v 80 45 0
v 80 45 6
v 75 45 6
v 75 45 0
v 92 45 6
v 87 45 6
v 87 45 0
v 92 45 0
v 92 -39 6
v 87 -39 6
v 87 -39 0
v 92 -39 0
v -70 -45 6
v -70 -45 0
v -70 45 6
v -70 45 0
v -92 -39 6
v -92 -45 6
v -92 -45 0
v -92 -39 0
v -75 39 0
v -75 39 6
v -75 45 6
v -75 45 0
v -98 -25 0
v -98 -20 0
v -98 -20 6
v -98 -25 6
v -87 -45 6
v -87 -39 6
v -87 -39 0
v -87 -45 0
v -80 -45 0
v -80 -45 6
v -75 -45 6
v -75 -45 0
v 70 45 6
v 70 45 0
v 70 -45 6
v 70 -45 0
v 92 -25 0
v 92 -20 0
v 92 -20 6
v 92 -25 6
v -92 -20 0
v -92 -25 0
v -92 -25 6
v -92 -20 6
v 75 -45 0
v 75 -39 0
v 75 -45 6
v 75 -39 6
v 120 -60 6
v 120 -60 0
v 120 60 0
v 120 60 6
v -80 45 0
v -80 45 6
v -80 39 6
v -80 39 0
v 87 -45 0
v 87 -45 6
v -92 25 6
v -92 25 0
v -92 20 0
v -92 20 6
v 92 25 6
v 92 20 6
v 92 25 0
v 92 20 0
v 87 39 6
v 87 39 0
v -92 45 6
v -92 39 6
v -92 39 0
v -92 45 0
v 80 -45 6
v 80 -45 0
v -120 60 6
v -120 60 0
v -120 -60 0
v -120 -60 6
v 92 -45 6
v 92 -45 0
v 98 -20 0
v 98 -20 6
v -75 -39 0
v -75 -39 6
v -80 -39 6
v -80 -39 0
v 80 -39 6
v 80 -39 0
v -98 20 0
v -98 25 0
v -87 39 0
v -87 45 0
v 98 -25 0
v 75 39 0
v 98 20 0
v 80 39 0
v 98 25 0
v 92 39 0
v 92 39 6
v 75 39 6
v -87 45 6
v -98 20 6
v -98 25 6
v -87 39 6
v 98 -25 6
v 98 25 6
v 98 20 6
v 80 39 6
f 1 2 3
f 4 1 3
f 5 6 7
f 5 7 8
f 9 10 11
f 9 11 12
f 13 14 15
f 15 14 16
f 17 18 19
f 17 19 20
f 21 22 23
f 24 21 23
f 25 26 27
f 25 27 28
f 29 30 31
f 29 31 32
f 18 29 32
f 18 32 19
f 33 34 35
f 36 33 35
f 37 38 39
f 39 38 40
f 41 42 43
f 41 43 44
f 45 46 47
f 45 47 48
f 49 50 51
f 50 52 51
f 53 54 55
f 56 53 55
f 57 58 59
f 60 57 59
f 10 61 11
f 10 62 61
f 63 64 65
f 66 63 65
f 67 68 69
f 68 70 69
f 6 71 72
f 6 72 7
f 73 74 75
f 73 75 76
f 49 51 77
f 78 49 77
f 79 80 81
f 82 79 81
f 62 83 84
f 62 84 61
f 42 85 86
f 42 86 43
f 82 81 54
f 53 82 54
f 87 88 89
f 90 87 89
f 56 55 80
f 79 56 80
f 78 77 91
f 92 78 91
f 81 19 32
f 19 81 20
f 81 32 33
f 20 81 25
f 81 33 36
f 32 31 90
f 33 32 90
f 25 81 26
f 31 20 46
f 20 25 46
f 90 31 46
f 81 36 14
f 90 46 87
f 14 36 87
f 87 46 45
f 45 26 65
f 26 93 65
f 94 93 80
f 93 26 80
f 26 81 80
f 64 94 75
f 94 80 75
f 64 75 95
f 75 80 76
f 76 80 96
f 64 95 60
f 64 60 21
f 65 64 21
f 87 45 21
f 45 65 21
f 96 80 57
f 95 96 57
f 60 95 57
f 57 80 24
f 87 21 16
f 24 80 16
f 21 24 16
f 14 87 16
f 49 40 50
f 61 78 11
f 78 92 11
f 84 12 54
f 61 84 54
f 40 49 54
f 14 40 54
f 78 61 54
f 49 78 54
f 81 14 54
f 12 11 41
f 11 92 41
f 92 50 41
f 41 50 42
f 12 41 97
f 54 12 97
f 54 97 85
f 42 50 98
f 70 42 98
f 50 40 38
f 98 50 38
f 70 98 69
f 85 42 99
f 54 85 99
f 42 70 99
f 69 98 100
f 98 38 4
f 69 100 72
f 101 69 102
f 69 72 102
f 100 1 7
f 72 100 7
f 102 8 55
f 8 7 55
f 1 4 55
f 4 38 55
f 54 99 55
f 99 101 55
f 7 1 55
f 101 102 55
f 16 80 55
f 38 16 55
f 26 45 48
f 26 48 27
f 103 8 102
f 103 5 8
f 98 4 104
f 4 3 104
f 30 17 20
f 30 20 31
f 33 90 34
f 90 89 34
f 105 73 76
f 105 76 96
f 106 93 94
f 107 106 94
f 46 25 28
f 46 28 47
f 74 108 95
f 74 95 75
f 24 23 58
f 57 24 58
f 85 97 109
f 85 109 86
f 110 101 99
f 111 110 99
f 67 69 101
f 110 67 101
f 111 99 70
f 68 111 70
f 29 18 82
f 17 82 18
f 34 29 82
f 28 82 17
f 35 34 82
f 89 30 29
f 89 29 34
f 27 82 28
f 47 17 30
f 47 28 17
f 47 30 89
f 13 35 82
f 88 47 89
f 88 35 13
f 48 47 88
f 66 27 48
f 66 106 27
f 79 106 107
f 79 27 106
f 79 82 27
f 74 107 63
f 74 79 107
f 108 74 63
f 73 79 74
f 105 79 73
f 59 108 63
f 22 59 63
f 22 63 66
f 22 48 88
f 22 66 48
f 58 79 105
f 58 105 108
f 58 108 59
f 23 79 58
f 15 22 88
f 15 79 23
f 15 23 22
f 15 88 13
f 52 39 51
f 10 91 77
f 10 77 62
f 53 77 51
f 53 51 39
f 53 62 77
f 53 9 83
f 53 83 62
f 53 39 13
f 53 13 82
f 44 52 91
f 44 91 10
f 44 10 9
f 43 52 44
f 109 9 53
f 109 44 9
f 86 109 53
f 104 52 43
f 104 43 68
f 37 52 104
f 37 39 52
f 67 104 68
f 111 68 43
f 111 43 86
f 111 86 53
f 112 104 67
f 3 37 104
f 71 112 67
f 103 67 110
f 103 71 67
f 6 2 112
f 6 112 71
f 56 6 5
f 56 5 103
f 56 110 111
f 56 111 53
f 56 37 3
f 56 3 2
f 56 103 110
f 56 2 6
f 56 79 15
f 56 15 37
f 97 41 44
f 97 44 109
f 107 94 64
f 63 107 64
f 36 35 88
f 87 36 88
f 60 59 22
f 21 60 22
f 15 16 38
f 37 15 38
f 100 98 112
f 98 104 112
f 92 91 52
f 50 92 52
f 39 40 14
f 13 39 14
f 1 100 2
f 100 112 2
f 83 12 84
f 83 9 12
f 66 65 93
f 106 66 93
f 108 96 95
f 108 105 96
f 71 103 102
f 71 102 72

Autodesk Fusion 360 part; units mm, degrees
sketch "Sketch1" plane through (0, 0, 0) normal (0, 0, 1) x (1, 0, 0) in component "Base"
  line L0 (120, 60) -> (-120, 60)
  line L1 (-120, 60) -> (-120, -60)
  line L2 (-120, -60) -> (120, -60)
  line L3 (120, -60) -> (120, 60)
  line L4 (120, 60) -> (-120, -60) construction
  line L5 (-120, 60) -> (120, -60) construction
  line L6 (-70, 45) -> (70, 45)
  line L7 (70, 45) -> (70, -45)
  line L8 (70, -45) -> (-70, -45)
  line L9 (-70, -45) -> (-70, 45)
  line L10 (-70, 45) -> (70, -45) construction
  line L11 (70, 45) -> (-70, -45) construction
  dimension "d1" = 240
  dimension "d2" = 120
  dimension "d3" = 90
  dimension "d6" = 140
extrude "Extrude1" add sketch "Sketch1" along normal blind 6 in component "Base"
sketch "Sketch2" plane through (0, 0, 6) normal (0, 0, 1) x (-1, 0, 0) in component "Base"
  line L0 (-70, 45) -> (70, 45)
  line L1 (70, 45) -> (70, -45)
  line L2 (70, -45) -> (-70, -45)
  line L3 (-70, -45) -> (-70, 45)
  line L4 (-120, 60) -> (-120, -60)
  line L5 (-120, -60) -> (120, -60)
  line L6 (120, -60) -> (120, 60)
  line L7 (120, 60) -> (-120, 60)
  line L8 (70, 45) -> (92, 45) construction
  line L9 (92, 45) -> (92, 39) construction
  line L10 (92, 39) -> (70, 39) construction
  line L11 (70, 39) -> (70, 45) construction
  line L12 (92, 39) -> (87, 39)
  line L13 (87, 39) -> (87, 45)
  line L14 (87, 45) -> (92, 45)
  line L15 (92, 45) -> (92, 39)
  line L16 (70, 39) -> (75, 39) construction
  line L17 (75, 45) -> (75, 39) construction
  line L18 (75, 39) -> (80, 39)
  line L19 (80, 39) -> (80, 45)
  line L20 (80, 45) -> (75, 45)
  line L21 (75, 45) -> (75, 39)
  dimension "d15" = 6
extrude "Extrude2" cut sketch "Sketch2" against normal blind 6 contours L12 L13 L14 L15 | L18 L19 L20 L21 in component "Base"
ref_plane "WorkPlane1" through (0, 0, 0) normal (1, 0, 0) x (0, 1, 0) in component "Base"
mirror "Mirror1" about plane through (0, 0, 0) normal (1, 0, 0) of "Extrude2" in component "Base"
ref_plane "WorkPlane2" through (0, 0, 0) normal (0, 1, 0) x (0, 0, 1) in component "Base"
mirror "Mirror2" about plane through (0, 0, 0) normal (0, 1, 0) of "Extrude2", "Mirror1" in component "Base"
sketch "Sketch3" plane through (0, 0, 0) normal (0, 0, -1) x (1, 0, 0) in component "Base"
  line L0 (87, -45) -> (87, -39)
  line L1 (87, -39) -> (92, -39)
  line L2 (92, -39) -> (92, -45)
  line L3 (92, -45) -> (87, -45)
  line L4 (75, -39) -> (80, -39)
  line L5 (80, -39) -> (80, -45)
  line L6 (80, -45) -> (75, -45)
  line L7 (75, -45) -> (75, -39)
  line L8 (-87, -39) -> (-87, -45)
  line L9 (-87, -45) -> (-92, -45)
  line L10 (-92, -45) -> (-92, -39)
  line L11 (-92, -39) -> (-87, -39)
  line L12 (-80, -39) -> (-75, -39)
  line L13 (-75, -39) -> (-75, -45)
  line L14 (-75, -45) -> (-80, -45)
  line L15 (-80, -45) -> (-80, -39)
  line L16 (87, 39) -> (87, 45)
  line L17 (87, 45) -> (92, 45)
  line L18 (92, 45) -> (92, 39)
  line L19 (92, 39) -> (87, 39)
  line L20 (80, 39) -> (75, 39)
  line L21 (75, 39) -> (75, 45)
  line L22 (75, 45) -> (80, 45)
  line L23 (80, 45) -> (80, 39)
  line L24 (-87, 45) -> (-87, 39)
  line L25 (-87, 39) -> (-92, 39)
  line L26 (-92, 39) -> (-92, 45)
  line L27 (-92, 45) -> (-87, 45)
  line L28 (-75, 39) -> (-80, 39)
  line L29 (-80, 39) -> (-80, 45)
  line L30 (-80, 45) -> (-75, 45)
  line L31 (-75, 45) -> (-75, 39)
  line L32 (-70, 45) -> (70, 45)
  line L33 (70, 45) -> (70, -45)
  line L34 (70, -45) -> (-70, -45)
  line L35 (-70, -45) -> (-70, 45)
  line L36 (120, -60) -> (120, 60)
  line L37 (120, 60) -> (-120, 60)
  line L38 (-120, 60) -> (-120, -60)
  line L39 (-120, -60) -> (120, -60)
  line L40 (-120, 0) -> (-70, 0) construction
  line L41 (-87, -39) -> (-87, 39) construction
  line L42 (-87, 0) -> (-87, -20) construction
  line L43 (-87, 0) -> (-87, -20) construction
  line L44 (-87, 0) -> (-93, 0) construction
  line L45 (-87, 0) -> (-92, 0) construction
  line L46 (-92, 0) -> (-92, -20) construction
  line L47 (-92, -20) -> (-87, -20) construction
  line L48 (-87, -20) -> (-87, 0) construction
  line L49 (-87, 0) -> (-91.9449, 0) construction
  line L50 (-91.9449, 20) -> (-87, 20) construction
  line L51 (-87, 20) -> (-87, 0) construction
  line L52 (-87, 0) -> (-92, 0) construction
  line L53 (-92, 0) -> (-92, 20) construction
  line L54 (-92, 20) -> (-87, 20) construction
  line L55 (-87, 20) -> (-87, 0) construction
  line L56 (-92, -20) -> (-98, -20)
  line L57 (-98, -20) -> (-98, -25)
  line L58 (-98, -25) -> (-92, -25)
  line L59 (-92, -25) -> (-92, -20)
  line L60 (-92, 20) -> (-98, 20)
  line L61 (-98, 20) -> (-98, 25)
  line L62 (-98, 25) -> (-92, 25)
  line L63 (-92, 25) -> (-92, 20)
  dimension "d16" = 5
  dimension "d17" = 20
  dimension "d18" = 20
extrude "Extrude3" cut sketch "Sketch3" against normal blind 11 contours L56 L57 L58 L59 | L60 L61 L62 L63 in component "Base"
mirror "Mirror3" about plane through (0, 0, 0) normal (1, 0, 0) of "Extrude3" in component "Base"
component "Base" placed x (1, 0, 0) y (0, 1, 0) z (0, 0, 1) at (0, 0, 0)
